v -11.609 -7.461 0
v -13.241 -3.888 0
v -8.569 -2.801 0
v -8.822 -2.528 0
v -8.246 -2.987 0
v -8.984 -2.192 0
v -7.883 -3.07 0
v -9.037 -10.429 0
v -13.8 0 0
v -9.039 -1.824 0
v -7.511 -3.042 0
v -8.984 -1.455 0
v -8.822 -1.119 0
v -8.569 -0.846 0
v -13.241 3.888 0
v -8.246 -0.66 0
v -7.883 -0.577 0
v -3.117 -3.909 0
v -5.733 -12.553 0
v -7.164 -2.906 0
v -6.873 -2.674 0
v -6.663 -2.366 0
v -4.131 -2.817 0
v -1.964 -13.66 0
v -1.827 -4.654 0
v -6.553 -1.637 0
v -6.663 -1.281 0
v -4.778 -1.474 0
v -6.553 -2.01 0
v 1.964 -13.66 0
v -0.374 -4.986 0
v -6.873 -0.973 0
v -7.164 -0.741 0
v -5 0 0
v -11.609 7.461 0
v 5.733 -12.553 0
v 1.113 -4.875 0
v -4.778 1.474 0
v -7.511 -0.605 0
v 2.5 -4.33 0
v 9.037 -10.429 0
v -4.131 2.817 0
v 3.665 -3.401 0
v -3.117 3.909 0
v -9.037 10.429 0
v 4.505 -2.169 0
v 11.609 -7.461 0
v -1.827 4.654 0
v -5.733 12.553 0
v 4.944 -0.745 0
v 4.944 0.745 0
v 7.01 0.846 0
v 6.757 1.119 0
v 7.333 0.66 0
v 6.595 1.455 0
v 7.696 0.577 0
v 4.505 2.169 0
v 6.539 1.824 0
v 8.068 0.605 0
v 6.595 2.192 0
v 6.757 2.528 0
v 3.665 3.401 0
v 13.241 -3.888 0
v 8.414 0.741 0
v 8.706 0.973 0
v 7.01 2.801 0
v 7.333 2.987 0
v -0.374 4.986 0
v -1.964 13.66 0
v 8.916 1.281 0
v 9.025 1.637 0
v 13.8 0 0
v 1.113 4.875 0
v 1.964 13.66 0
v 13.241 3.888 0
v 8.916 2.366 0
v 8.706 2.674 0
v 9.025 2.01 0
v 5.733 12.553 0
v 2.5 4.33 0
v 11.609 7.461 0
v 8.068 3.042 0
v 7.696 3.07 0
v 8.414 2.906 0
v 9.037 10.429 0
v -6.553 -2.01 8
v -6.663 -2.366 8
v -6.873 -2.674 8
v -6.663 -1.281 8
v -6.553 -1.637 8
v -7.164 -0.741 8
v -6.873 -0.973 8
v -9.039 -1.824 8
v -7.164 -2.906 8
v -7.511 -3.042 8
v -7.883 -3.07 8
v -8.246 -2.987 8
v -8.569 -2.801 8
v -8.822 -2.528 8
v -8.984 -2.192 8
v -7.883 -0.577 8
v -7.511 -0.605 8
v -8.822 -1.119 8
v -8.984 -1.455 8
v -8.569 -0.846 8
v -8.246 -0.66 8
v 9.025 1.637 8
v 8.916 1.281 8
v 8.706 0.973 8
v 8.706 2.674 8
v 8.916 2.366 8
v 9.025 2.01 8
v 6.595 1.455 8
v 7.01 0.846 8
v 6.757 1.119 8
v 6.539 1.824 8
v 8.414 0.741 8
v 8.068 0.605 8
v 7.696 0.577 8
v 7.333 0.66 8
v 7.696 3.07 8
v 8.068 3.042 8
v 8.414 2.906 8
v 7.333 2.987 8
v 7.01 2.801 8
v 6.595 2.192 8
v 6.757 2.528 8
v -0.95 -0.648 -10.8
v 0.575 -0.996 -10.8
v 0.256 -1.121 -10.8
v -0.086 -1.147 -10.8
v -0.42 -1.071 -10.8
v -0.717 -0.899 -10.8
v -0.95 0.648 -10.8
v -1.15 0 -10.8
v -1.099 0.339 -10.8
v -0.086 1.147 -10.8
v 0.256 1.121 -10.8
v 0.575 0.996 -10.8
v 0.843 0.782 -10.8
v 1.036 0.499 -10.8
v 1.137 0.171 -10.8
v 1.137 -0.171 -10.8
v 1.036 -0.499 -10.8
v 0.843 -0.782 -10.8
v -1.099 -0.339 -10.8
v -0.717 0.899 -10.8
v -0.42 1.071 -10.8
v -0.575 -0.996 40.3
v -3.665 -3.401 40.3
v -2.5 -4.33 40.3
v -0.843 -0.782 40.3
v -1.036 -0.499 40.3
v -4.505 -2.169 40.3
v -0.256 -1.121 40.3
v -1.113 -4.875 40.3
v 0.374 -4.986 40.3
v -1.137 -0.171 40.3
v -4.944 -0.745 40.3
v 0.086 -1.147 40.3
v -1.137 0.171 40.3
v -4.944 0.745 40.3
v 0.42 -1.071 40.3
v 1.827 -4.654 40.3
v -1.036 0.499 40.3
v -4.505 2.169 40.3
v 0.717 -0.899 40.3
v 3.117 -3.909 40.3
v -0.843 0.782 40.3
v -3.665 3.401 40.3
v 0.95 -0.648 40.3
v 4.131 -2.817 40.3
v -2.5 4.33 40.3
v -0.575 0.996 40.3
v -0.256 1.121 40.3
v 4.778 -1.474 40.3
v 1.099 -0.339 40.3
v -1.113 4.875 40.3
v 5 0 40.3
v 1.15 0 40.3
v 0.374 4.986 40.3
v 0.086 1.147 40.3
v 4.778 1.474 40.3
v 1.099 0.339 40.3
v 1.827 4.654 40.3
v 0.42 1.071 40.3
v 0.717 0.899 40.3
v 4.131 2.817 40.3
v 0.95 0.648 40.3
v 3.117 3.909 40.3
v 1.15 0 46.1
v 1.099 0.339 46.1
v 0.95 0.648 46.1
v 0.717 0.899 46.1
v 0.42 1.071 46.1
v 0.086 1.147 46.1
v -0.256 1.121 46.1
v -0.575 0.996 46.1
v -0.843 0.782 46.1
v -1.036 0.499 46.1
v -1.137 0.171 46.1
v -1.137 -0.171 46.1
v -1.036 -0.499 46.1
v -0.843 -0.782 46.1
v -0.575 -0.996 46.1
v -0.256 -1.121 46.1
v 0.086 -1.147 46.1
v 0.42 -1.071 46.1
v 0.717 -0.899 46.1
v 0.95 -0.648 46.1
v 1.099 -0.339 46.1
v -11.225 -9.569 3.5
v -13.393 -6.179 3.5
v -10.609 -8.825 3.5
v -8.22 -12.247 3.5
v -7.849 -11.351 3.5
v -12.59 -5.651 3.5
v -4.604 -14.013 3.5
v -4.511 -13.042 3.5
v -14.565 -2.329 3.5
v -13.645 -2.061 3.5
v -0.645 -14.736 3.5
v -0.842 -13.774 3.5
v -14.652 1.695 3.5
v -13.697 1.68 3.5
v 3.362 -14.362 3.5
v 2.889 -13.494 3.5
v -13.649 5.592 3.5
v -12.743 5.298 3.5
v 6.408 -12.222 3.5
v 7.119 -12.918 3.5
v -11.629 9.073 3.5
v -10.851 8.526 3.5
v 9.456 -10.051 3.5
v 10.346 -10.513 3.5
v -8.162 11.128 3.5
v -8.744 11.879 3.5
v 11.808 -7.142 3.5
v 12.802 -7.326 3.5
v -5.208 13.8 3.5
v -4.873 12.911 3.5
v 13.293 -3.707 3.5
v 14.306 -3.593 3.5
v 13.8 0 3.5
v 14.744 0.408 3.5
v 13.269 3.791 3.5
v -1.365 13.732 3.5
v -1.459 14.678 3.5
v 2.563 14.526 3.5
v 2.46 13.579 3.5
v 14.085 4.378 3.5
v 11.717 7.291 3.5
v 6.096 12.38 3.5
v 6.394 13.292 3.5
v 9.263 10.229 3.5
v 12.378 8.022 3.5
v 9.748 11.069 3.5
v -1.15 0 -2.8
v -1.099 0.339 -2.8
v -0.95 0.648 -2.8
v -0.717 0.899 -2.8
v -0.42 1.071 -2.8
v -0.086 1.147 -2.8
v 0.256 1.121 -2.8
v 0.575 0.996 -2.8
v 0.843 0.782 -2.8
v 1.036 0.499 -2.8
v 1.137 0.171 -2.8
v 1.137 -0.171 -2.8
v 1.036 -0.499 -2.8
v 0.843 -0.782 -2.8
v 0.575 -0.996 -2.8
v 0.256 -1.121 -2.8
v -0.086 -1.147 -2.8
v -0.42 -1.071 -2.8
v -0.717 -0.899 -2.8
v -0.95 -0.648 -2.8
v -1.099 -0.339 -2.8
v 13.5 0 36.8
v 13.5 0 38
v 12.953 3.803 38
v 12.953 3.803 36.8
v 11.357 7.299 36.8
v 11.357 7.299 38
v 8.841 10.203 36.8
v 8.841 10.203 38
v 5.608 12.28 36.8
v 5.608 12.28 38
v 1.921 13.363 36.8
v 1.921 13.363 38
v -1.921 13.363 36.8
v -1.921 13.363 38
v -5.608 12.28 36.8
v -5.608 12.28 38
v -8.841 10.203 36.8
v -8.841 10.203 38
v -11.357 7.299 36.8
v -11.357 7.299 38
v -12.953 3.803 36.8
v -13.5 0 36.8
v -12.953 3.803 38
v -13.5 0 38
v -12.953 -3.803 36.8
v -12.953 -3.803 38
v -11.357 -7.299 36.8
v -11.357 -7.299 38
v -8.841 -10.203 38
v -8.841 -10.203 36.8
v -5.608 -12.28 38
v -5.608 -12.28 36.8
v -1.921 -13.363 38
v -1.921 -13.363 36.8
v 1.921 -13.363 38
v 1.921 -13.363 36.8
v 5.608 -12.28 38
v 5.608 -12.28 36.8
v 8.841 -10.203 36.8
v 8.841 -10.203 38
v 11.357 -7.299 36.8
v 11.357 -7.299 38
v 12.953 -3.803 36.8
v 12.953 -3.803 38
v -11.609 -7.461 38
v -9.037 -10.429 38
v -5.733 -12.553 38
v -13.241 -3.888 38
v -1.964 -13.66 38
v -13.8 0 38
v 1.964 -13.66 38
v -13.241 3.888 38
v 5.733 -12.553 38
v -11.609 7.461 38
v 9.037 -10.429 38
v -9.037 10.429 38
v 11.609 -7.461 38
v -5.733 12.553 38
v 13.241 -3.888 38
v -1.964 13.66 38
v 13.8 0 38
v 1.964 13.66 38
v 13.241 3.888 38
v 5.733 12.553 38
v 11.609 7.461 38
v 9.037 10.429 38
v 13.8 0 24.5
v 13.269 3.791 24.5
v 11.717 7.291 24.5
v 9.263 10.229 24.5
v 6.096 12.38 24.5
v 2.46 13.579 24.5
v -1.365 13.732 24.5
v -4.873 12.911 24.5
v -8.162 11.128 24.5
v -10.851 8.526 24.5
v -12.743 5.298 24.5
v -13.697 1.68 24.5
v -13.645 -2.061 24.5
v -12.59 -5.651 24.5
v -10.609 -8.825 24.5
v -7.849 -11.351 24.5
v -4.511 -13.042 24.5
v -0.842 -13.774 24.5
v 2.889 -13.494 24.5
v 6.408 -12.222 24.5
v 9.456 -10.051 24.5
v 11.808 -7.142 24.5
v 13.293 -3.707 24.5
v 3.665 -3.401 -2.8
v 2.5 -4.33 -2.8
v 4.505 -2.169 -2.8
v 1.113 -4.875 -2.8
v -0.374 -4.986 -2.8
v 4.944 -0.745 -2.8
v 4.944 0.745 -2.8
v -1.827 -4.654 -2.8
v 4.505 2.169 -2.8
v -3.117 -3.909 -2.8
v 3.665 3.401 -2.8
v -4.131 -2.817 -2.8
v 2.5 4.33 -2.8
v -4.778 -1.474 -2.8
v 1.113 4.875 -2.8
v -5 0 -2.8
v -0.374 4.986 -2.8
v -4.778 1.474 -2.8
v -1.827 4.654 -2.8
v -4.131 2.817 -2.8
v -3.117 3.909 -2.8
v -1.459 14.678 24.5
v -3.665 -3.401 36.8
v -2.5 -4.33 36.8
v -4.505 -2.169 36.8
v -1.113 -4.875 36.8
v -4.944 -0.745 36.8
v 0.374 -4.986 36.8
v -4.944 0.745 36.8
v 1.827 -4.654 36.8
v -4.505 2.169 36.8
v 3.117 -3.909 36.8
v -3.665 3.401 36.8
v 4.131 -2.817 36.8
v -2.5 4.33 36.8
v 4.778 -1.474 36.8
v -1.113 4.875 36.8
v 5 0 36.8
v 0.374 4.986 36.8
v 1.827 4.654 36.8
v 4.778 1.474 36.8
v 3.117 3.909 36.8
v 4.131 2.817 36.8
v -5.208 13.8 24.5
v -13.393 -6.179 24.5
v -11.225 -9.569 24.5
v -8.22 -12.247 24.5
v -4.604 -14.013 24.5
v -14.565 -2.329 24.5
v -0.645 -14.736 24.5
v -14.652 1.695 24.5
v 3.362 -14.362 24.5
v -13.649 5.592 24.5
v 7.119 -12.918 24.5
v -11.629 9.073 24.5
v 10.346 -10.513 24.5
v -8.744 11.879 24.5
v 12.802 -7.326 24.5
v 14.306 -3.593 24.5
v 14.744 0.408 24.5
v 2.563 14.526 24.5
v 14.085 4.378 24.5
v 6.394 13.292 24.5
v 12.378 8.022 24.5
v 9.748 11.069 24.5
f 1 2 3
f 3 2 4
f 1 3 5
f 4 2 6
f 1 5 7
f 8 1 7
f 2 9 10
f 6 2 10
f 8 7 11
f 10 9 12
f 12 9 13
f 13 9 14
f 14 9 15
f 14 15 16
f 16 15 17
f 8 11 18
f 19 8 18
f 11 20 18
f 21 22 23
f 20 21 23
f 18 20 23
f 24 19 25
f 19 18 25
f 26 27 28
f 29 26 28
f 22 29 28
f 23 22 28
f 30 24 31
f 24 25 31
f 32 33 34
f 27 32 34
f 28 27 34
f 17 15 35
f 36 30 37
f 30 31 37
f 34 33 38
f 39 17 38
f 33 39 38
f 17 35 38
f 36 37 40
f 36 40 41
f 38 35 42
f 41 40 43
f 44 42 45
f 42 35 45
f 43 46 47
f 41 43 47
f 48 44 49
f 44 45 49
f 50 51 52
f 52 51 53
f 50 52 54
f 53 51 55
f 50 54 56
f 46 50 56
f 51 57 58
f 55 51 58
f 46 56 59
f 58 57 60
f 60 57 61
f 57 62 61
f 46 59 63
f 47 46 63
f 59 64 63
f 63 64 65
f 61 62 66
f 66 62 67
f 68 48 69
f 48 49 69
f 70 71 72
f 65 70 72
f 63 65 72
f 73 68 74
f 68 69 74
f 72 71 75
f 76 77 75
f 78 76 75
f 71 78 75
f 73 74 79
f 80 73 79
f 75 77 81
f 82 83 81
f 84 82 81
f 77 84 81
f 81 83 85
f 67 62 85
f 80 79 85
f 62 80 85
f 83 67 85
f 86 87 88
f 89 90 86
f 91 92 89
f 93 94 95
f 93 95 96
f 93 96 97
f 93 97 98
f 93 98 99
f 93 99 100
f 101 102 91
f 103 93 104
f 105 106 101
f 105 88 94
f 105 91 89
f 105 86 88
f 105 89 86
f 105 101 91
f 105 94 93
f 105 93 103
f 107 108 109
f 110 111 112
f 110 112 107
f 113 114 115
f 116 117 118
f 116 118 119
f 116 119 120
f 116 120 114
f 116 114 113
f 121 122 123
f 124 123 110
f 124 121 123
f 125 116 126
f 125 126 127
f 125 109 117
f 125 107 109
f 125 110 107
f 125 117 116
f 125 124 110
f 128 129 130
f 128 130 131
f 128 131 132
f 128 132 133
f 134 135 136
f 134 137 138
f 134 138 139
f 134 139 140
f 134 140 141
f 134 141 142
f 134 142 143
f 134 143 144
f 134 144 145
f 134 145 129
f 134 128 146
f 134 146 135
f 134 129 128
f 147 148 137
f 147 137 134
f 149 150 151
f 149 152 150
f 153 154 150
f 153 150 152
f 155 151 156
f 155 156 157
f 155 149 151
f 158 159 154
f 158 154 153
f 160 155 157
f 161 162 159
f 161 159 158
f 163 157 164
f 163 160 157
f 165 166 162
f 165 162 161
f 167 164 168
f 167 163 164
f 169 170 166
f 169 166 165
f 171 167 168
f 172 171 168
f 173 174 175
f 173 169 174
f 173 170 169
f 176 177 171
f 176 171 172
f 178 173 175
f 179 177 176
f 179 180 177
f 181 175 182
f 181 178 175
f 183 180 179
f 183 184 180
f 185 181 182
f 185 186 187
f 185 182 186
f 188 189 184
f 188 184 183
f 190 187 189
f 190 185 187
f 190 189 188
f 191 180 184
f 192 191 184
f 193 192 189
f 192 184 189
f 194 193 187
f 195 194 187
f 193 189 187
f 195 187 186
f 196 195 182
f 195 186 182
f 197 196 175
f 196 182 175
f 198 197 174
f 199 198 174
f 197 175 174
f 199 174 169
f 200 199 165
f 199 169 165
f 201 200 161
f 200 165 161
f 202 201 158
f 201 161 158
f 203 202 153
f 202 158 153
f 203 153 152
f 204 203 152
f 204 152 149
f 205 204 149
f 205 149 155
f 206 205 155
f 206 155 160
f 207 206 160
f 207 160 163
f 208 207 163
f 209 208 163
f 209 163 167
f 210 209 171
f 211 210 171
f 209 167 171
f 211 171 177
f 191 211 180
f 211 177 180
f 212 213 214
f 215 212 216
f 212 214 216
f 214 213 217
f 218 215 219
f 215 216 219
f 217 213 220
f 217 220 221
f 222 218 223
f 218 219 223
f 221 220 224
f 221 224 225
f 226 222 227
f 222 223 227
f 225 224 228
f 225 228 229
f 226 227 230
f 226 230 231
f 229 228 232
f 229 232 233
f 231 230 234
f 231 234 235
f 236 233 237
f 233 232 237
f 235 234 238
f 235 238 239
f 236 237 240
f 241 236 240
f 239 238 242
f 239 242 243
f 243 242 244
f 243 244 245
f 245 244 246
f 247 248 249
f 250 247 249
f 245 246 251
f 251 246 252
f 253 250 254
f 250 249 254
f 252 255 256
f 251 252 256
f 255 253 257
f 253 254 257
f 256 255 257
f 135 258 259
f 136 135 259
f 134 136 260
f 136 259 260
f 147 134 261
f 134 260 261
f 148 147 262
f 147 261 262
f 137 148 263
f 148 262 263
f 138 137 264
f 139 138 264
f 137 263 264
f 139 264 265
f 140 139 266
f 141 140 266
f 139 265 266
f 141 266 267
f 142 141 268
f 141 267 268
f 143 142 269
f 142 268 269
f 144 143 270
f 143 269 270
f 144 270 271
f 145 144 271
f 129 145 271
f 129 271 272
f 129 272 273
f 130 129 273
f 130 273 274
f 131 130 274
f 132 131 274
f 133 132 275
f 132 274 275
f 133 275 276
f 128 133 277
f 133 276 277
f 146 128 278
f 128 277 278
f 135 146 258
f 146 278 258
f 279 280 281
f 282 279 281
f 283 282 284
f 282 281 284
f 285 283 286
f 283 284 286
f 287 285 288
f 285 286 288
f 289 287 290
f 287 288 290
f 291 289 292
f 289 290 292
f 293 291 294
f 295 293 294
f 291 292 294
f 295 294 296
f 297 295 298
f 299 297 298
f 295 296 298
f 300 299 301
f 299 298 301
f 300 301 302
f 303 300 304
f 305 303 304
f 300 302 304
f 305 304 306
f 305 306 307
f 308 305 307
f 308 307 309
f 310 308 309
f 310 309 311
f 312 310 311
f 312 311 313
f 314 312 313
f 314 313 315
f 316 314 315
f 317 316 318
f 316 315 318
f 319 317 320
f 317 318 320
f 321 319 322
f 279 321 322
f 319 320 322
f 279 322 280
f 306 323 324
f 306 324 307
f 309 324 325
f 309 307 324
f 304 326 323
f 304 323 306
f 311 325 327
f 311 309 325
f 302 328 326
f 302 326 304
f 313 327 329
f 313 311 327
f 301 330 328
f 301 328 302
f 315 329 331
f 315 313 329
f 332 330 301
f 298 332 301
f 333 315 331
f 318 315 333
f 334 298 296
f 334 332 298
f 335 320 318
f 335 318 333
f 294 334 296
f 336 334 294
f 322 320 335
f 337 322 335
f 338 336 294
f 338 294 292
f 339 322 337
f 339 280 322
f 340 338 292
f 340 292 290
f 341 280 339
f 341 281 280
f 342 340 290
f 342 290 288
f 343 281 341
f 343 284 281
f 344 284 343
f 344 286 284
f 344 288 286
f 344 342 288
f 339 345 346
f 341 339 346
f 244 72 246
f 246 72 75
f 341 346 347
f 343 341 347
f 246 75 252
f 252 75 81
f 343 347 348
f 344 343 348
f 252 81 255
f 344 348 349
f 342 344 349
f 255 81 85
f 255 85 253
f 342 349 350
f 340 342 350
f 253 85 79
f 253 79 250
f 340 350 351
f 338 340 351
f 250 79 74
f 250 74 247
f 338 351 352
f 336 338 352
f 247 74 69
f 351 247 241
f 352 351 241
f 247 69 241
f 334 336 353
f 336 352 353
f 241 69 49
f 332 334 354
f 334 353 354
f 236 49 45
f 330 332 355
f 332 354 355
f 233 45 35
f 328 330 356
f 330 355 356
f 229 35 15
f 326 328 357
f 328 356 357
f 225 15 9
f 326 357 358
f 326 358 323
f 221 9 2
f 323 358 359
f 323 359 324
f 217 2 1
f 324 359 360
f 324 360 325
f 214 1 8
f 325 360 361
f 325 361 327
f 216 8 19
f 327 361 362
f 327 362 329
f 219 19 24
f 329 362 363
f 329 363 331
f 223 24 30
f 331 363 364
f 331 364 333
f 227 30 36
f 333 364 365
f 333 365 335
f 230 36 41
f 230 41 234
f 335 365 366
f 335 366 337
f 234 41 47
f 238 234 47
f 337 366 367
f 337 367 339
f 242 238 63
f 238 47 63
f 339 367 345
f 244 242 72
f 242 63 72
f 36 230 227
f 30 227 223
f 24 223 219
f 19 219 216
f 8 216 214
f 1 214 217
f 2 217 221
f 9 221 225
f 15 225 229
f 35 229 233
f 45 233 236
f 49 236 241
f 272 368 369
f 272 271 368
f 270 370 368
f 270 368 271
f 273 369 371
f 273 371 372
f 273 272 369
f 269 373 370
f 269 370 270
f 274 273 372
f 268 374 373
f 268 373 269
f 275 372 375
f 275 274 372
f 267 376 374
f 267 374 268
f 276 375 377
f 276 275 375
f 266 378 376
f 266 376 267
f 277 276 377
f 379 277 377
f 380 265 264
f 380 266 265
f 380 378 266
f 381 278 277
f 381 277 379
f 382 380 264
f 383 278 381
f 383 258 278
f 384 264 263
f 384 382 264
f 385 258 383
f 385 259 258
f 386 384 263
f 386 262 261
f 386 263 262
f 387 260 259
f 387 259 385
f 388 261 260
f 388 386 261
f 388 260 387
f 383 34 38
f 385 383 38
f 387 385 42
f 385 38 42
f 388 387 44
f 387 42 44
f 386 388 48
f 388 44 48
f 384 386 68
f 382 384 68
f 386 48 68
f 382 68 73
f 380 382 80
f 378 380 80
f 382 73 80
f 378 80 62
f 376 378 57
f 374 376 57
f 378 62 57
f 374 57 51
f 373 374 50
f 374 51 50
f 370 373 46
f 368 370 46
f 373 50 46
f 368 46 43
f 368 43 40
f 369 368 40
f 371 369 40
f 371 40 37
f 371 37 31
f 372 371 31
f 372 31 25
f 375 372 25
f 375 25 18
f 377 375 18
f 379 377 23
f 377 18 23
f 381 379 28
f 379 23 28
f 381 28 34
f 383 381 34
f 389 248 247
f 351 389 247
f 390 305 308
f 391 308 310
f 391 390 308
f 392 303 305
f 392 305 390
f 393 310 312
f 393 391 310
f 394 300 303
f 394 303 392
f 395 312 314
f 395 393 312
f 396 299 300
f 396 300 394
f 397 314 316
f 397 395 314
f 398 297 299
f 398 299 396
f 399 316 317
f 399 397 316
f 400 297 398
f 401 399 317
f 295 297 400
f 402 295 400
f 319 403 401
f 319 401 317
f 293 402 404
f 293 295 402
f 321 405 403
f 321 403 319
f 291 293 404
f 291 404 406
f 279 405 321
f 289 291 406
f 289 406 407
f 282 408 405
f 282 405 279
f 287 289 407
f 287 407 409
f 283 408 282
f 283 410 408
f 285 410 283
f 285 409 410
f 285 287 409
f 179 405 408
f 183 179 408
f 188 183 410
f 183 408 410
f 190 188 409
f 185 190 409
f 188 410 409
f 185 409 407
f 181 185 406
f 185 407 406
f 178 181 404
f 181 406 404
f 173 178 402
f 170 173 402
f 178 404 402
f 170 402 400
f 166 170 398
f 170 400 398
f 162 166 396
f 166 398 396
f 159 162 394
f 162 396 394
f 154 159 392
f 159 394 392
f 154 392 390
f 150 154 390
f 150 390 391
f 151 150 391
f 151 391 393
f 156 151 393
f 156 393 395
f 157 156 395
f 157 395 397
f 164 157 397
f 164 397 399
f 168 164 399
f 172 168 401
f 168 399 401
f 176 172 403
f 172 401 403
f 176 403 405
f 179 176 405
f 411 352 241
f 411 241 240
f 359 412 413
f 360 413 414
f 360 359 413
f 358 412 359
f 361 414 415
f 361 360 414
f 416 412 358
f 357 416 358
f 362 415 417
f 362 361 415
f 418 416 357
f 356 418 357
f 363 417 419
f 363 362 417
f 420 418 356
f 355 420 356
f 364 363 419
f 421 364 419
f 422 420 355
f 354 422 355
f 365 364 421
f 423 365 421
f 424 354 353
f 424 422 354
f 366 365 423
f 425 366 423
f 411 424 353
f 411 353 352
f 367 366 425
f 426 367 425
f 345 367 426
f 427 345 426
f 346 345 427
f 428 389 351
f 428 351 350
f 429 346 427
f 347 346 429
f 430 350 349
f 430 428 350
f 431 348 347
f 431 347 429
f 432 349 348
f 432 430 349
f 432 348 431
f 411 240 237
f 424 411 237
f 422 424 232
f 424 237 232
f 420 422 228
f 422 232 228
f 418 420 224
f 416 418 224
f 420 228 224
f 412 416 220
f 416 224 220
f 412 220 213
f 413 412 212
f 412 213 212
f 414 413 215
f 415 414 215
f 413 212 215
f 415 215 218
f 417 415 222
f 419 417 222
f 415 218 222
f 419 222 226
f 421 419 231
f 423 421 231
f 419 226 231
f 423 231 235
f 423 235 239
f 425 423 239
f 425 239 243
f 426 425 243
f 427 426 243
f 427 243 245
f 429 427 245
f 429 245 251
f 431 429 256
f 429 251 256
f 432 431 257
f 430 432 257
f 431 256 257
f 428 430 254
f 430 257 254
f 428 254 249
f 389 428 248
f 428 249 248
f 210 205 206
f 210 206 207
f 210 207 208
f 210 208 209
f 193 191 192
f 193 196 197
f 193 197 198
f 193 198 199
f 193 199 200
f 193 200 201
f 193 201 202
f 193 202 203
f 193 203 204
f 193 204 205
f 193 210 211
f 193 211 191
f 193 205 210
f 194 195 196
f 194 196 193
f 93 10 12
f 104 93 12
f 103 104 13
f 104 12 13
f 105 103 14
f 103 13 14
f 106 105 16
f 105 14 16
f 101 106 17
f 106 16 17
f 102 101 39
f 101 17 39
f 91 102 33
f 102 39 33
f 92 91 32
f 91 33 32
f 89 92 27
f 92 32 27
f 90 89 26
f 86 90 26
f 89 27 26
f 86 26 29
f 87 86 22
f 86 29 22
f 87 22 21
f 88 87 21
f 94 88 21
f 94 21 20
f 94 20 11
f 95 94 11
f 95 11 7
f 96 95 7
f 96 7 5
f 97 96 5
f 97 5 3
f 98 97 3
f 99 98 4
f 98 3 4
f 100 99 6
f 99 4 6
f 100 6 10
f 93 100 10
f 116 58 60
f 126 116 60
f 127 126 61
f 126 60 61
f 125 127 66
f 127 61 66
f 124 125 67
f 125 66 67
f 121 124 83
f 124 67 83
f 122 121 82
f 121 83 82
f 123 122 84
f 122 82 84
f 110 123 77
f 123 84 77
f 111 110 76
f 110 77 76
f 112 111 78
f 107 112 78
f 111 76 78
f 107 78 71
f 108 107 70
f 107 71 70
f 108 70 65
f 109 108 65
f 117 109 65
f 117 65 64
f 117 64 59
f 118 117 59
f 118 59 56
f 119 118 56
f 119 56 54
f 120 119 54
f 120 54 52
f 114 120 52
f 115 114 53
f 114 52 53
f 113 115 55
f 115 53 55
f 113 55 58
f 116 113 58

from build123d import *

# Parameters (mm, degrees)
SKETCH1_R           = 13.8
BOSS_EXTRUDE1_DEPTH = 38
BOSS_EXTRUDE2_START = -34.5
BOSS_EXTRUDE2_DEPTH = 21
SKETCH3_R           = 5
BOSS_EXTRUDE3_DEPTH = 2.8
SKETCH4_R           = 13.5
CUT_EXTRUDE1_DEPTH  = 1.2
SKETCH5_R           = 5
BOSS_EXTRUDE4_DEPTH = 3.5
SKETCH6_R           = 1.15
BOSS_EXTRUDE5_DEPTH = 5.8
SKETCH7_R           = 1.15
BOSS_EXTRUDE6_DEPTH = 8
SKETCH8_R           = 1.25
CUT_EXTRUDE2_DEPTH  = 8


with BuildPart() as part:
    # Sketch1 → Boss-Extrude1 (new body)
    with BuildSketch(Plane.XY):
        Circle(SKETCH1_R)
    extrude(amount=BOSS_EXTRUDE1_DEPTH)

    # Sketch2 → Boss-Extrude2 (add)
    with BuildSketch(Plane.XY.offset(38).offset(BOSS_EXTRUDE2_START)):
        with BuildLine():
            Line((-1.458768031, 14.677687006), (-1.36481348, 13.732344453))
            ThreePointArc((-1.36481348, 13.732344453), (3.145567943, -13.436718436), (-4.872500867, 12.911186441))
            Line((-4.872500867, 12.911186441), (-5.207926651, 13.8))
            ThreePointArc((-5.207926651, 13.8), (3.362110664, -14.361709922), (-1.458768031, 14.677687006))
        make_face()
    extrude(amount=BOSS_EXTRUDE2_DEPTH)

    # Sketch3 → Boss-Extrude3 (add)
    with BuildSketch(Plane(origin=(0, 0, 0), x_dir=(-1, 0, 0), z_dir=(0, 0, -1))):
        Circle(SKETCH3_R)
    extrude(amount=BOSS_EXTRUDE3_DEPTH)

    # Sketch4 → Cut-Extrude1 (cut)
    with BuildSketch(Plane.XY.offset(38)):
        Circle(SKETCH4_R)
    extrude(amount=-CUT_EXTRUDE1_DEPTH, mode=Mode.SUBTRACT)

    # Sketch5 → Boss-Extrude4 (add)
    with BuildSketch(Plane.XY.offset(36.8)):
        Circle(SKETCH5_R)
    extrude(amount=BOSS_EXTRUDE4_DEPTH)

    # Sketch6 → Boss-Extrude5 (add)
    with BuildSketch(Plane.XY.offset(40.3)):
        Circle(SKETCH6_R)
    extrude(amount=BOSS_EXTRUDE5_DEPTH)

    # Sketch7 → Boss-Extrude6 (add)
    with BuildSketch(Plane(origin=(0, 0, -2.8), x_dir=(-1, 0, 0), z_dir=(0, 0, -1))):
        Circle(SKETCH7_R)
    extrude(amount=BOSS_EXTRUDE6_DEPTH)

    # Sketch8 → Cut-Extrude2 (cut)
    with BuildSketch(Plane(origin=(0, 0, 0), x_dir=(-1, 0, 0), z_dir=(0, 0, -1))):
        with Locations((-7.789401992, 1.823517648)):
            Circle(SKETCH8_R)
        with Locations((7.789401992, -1.823517648)):
            Circle(SKETCH8_R)
    extrude(amount=-CUT_EXTRUDE2_DEPTH, mode=Mode.SUBTRACT)


solid = part.part
